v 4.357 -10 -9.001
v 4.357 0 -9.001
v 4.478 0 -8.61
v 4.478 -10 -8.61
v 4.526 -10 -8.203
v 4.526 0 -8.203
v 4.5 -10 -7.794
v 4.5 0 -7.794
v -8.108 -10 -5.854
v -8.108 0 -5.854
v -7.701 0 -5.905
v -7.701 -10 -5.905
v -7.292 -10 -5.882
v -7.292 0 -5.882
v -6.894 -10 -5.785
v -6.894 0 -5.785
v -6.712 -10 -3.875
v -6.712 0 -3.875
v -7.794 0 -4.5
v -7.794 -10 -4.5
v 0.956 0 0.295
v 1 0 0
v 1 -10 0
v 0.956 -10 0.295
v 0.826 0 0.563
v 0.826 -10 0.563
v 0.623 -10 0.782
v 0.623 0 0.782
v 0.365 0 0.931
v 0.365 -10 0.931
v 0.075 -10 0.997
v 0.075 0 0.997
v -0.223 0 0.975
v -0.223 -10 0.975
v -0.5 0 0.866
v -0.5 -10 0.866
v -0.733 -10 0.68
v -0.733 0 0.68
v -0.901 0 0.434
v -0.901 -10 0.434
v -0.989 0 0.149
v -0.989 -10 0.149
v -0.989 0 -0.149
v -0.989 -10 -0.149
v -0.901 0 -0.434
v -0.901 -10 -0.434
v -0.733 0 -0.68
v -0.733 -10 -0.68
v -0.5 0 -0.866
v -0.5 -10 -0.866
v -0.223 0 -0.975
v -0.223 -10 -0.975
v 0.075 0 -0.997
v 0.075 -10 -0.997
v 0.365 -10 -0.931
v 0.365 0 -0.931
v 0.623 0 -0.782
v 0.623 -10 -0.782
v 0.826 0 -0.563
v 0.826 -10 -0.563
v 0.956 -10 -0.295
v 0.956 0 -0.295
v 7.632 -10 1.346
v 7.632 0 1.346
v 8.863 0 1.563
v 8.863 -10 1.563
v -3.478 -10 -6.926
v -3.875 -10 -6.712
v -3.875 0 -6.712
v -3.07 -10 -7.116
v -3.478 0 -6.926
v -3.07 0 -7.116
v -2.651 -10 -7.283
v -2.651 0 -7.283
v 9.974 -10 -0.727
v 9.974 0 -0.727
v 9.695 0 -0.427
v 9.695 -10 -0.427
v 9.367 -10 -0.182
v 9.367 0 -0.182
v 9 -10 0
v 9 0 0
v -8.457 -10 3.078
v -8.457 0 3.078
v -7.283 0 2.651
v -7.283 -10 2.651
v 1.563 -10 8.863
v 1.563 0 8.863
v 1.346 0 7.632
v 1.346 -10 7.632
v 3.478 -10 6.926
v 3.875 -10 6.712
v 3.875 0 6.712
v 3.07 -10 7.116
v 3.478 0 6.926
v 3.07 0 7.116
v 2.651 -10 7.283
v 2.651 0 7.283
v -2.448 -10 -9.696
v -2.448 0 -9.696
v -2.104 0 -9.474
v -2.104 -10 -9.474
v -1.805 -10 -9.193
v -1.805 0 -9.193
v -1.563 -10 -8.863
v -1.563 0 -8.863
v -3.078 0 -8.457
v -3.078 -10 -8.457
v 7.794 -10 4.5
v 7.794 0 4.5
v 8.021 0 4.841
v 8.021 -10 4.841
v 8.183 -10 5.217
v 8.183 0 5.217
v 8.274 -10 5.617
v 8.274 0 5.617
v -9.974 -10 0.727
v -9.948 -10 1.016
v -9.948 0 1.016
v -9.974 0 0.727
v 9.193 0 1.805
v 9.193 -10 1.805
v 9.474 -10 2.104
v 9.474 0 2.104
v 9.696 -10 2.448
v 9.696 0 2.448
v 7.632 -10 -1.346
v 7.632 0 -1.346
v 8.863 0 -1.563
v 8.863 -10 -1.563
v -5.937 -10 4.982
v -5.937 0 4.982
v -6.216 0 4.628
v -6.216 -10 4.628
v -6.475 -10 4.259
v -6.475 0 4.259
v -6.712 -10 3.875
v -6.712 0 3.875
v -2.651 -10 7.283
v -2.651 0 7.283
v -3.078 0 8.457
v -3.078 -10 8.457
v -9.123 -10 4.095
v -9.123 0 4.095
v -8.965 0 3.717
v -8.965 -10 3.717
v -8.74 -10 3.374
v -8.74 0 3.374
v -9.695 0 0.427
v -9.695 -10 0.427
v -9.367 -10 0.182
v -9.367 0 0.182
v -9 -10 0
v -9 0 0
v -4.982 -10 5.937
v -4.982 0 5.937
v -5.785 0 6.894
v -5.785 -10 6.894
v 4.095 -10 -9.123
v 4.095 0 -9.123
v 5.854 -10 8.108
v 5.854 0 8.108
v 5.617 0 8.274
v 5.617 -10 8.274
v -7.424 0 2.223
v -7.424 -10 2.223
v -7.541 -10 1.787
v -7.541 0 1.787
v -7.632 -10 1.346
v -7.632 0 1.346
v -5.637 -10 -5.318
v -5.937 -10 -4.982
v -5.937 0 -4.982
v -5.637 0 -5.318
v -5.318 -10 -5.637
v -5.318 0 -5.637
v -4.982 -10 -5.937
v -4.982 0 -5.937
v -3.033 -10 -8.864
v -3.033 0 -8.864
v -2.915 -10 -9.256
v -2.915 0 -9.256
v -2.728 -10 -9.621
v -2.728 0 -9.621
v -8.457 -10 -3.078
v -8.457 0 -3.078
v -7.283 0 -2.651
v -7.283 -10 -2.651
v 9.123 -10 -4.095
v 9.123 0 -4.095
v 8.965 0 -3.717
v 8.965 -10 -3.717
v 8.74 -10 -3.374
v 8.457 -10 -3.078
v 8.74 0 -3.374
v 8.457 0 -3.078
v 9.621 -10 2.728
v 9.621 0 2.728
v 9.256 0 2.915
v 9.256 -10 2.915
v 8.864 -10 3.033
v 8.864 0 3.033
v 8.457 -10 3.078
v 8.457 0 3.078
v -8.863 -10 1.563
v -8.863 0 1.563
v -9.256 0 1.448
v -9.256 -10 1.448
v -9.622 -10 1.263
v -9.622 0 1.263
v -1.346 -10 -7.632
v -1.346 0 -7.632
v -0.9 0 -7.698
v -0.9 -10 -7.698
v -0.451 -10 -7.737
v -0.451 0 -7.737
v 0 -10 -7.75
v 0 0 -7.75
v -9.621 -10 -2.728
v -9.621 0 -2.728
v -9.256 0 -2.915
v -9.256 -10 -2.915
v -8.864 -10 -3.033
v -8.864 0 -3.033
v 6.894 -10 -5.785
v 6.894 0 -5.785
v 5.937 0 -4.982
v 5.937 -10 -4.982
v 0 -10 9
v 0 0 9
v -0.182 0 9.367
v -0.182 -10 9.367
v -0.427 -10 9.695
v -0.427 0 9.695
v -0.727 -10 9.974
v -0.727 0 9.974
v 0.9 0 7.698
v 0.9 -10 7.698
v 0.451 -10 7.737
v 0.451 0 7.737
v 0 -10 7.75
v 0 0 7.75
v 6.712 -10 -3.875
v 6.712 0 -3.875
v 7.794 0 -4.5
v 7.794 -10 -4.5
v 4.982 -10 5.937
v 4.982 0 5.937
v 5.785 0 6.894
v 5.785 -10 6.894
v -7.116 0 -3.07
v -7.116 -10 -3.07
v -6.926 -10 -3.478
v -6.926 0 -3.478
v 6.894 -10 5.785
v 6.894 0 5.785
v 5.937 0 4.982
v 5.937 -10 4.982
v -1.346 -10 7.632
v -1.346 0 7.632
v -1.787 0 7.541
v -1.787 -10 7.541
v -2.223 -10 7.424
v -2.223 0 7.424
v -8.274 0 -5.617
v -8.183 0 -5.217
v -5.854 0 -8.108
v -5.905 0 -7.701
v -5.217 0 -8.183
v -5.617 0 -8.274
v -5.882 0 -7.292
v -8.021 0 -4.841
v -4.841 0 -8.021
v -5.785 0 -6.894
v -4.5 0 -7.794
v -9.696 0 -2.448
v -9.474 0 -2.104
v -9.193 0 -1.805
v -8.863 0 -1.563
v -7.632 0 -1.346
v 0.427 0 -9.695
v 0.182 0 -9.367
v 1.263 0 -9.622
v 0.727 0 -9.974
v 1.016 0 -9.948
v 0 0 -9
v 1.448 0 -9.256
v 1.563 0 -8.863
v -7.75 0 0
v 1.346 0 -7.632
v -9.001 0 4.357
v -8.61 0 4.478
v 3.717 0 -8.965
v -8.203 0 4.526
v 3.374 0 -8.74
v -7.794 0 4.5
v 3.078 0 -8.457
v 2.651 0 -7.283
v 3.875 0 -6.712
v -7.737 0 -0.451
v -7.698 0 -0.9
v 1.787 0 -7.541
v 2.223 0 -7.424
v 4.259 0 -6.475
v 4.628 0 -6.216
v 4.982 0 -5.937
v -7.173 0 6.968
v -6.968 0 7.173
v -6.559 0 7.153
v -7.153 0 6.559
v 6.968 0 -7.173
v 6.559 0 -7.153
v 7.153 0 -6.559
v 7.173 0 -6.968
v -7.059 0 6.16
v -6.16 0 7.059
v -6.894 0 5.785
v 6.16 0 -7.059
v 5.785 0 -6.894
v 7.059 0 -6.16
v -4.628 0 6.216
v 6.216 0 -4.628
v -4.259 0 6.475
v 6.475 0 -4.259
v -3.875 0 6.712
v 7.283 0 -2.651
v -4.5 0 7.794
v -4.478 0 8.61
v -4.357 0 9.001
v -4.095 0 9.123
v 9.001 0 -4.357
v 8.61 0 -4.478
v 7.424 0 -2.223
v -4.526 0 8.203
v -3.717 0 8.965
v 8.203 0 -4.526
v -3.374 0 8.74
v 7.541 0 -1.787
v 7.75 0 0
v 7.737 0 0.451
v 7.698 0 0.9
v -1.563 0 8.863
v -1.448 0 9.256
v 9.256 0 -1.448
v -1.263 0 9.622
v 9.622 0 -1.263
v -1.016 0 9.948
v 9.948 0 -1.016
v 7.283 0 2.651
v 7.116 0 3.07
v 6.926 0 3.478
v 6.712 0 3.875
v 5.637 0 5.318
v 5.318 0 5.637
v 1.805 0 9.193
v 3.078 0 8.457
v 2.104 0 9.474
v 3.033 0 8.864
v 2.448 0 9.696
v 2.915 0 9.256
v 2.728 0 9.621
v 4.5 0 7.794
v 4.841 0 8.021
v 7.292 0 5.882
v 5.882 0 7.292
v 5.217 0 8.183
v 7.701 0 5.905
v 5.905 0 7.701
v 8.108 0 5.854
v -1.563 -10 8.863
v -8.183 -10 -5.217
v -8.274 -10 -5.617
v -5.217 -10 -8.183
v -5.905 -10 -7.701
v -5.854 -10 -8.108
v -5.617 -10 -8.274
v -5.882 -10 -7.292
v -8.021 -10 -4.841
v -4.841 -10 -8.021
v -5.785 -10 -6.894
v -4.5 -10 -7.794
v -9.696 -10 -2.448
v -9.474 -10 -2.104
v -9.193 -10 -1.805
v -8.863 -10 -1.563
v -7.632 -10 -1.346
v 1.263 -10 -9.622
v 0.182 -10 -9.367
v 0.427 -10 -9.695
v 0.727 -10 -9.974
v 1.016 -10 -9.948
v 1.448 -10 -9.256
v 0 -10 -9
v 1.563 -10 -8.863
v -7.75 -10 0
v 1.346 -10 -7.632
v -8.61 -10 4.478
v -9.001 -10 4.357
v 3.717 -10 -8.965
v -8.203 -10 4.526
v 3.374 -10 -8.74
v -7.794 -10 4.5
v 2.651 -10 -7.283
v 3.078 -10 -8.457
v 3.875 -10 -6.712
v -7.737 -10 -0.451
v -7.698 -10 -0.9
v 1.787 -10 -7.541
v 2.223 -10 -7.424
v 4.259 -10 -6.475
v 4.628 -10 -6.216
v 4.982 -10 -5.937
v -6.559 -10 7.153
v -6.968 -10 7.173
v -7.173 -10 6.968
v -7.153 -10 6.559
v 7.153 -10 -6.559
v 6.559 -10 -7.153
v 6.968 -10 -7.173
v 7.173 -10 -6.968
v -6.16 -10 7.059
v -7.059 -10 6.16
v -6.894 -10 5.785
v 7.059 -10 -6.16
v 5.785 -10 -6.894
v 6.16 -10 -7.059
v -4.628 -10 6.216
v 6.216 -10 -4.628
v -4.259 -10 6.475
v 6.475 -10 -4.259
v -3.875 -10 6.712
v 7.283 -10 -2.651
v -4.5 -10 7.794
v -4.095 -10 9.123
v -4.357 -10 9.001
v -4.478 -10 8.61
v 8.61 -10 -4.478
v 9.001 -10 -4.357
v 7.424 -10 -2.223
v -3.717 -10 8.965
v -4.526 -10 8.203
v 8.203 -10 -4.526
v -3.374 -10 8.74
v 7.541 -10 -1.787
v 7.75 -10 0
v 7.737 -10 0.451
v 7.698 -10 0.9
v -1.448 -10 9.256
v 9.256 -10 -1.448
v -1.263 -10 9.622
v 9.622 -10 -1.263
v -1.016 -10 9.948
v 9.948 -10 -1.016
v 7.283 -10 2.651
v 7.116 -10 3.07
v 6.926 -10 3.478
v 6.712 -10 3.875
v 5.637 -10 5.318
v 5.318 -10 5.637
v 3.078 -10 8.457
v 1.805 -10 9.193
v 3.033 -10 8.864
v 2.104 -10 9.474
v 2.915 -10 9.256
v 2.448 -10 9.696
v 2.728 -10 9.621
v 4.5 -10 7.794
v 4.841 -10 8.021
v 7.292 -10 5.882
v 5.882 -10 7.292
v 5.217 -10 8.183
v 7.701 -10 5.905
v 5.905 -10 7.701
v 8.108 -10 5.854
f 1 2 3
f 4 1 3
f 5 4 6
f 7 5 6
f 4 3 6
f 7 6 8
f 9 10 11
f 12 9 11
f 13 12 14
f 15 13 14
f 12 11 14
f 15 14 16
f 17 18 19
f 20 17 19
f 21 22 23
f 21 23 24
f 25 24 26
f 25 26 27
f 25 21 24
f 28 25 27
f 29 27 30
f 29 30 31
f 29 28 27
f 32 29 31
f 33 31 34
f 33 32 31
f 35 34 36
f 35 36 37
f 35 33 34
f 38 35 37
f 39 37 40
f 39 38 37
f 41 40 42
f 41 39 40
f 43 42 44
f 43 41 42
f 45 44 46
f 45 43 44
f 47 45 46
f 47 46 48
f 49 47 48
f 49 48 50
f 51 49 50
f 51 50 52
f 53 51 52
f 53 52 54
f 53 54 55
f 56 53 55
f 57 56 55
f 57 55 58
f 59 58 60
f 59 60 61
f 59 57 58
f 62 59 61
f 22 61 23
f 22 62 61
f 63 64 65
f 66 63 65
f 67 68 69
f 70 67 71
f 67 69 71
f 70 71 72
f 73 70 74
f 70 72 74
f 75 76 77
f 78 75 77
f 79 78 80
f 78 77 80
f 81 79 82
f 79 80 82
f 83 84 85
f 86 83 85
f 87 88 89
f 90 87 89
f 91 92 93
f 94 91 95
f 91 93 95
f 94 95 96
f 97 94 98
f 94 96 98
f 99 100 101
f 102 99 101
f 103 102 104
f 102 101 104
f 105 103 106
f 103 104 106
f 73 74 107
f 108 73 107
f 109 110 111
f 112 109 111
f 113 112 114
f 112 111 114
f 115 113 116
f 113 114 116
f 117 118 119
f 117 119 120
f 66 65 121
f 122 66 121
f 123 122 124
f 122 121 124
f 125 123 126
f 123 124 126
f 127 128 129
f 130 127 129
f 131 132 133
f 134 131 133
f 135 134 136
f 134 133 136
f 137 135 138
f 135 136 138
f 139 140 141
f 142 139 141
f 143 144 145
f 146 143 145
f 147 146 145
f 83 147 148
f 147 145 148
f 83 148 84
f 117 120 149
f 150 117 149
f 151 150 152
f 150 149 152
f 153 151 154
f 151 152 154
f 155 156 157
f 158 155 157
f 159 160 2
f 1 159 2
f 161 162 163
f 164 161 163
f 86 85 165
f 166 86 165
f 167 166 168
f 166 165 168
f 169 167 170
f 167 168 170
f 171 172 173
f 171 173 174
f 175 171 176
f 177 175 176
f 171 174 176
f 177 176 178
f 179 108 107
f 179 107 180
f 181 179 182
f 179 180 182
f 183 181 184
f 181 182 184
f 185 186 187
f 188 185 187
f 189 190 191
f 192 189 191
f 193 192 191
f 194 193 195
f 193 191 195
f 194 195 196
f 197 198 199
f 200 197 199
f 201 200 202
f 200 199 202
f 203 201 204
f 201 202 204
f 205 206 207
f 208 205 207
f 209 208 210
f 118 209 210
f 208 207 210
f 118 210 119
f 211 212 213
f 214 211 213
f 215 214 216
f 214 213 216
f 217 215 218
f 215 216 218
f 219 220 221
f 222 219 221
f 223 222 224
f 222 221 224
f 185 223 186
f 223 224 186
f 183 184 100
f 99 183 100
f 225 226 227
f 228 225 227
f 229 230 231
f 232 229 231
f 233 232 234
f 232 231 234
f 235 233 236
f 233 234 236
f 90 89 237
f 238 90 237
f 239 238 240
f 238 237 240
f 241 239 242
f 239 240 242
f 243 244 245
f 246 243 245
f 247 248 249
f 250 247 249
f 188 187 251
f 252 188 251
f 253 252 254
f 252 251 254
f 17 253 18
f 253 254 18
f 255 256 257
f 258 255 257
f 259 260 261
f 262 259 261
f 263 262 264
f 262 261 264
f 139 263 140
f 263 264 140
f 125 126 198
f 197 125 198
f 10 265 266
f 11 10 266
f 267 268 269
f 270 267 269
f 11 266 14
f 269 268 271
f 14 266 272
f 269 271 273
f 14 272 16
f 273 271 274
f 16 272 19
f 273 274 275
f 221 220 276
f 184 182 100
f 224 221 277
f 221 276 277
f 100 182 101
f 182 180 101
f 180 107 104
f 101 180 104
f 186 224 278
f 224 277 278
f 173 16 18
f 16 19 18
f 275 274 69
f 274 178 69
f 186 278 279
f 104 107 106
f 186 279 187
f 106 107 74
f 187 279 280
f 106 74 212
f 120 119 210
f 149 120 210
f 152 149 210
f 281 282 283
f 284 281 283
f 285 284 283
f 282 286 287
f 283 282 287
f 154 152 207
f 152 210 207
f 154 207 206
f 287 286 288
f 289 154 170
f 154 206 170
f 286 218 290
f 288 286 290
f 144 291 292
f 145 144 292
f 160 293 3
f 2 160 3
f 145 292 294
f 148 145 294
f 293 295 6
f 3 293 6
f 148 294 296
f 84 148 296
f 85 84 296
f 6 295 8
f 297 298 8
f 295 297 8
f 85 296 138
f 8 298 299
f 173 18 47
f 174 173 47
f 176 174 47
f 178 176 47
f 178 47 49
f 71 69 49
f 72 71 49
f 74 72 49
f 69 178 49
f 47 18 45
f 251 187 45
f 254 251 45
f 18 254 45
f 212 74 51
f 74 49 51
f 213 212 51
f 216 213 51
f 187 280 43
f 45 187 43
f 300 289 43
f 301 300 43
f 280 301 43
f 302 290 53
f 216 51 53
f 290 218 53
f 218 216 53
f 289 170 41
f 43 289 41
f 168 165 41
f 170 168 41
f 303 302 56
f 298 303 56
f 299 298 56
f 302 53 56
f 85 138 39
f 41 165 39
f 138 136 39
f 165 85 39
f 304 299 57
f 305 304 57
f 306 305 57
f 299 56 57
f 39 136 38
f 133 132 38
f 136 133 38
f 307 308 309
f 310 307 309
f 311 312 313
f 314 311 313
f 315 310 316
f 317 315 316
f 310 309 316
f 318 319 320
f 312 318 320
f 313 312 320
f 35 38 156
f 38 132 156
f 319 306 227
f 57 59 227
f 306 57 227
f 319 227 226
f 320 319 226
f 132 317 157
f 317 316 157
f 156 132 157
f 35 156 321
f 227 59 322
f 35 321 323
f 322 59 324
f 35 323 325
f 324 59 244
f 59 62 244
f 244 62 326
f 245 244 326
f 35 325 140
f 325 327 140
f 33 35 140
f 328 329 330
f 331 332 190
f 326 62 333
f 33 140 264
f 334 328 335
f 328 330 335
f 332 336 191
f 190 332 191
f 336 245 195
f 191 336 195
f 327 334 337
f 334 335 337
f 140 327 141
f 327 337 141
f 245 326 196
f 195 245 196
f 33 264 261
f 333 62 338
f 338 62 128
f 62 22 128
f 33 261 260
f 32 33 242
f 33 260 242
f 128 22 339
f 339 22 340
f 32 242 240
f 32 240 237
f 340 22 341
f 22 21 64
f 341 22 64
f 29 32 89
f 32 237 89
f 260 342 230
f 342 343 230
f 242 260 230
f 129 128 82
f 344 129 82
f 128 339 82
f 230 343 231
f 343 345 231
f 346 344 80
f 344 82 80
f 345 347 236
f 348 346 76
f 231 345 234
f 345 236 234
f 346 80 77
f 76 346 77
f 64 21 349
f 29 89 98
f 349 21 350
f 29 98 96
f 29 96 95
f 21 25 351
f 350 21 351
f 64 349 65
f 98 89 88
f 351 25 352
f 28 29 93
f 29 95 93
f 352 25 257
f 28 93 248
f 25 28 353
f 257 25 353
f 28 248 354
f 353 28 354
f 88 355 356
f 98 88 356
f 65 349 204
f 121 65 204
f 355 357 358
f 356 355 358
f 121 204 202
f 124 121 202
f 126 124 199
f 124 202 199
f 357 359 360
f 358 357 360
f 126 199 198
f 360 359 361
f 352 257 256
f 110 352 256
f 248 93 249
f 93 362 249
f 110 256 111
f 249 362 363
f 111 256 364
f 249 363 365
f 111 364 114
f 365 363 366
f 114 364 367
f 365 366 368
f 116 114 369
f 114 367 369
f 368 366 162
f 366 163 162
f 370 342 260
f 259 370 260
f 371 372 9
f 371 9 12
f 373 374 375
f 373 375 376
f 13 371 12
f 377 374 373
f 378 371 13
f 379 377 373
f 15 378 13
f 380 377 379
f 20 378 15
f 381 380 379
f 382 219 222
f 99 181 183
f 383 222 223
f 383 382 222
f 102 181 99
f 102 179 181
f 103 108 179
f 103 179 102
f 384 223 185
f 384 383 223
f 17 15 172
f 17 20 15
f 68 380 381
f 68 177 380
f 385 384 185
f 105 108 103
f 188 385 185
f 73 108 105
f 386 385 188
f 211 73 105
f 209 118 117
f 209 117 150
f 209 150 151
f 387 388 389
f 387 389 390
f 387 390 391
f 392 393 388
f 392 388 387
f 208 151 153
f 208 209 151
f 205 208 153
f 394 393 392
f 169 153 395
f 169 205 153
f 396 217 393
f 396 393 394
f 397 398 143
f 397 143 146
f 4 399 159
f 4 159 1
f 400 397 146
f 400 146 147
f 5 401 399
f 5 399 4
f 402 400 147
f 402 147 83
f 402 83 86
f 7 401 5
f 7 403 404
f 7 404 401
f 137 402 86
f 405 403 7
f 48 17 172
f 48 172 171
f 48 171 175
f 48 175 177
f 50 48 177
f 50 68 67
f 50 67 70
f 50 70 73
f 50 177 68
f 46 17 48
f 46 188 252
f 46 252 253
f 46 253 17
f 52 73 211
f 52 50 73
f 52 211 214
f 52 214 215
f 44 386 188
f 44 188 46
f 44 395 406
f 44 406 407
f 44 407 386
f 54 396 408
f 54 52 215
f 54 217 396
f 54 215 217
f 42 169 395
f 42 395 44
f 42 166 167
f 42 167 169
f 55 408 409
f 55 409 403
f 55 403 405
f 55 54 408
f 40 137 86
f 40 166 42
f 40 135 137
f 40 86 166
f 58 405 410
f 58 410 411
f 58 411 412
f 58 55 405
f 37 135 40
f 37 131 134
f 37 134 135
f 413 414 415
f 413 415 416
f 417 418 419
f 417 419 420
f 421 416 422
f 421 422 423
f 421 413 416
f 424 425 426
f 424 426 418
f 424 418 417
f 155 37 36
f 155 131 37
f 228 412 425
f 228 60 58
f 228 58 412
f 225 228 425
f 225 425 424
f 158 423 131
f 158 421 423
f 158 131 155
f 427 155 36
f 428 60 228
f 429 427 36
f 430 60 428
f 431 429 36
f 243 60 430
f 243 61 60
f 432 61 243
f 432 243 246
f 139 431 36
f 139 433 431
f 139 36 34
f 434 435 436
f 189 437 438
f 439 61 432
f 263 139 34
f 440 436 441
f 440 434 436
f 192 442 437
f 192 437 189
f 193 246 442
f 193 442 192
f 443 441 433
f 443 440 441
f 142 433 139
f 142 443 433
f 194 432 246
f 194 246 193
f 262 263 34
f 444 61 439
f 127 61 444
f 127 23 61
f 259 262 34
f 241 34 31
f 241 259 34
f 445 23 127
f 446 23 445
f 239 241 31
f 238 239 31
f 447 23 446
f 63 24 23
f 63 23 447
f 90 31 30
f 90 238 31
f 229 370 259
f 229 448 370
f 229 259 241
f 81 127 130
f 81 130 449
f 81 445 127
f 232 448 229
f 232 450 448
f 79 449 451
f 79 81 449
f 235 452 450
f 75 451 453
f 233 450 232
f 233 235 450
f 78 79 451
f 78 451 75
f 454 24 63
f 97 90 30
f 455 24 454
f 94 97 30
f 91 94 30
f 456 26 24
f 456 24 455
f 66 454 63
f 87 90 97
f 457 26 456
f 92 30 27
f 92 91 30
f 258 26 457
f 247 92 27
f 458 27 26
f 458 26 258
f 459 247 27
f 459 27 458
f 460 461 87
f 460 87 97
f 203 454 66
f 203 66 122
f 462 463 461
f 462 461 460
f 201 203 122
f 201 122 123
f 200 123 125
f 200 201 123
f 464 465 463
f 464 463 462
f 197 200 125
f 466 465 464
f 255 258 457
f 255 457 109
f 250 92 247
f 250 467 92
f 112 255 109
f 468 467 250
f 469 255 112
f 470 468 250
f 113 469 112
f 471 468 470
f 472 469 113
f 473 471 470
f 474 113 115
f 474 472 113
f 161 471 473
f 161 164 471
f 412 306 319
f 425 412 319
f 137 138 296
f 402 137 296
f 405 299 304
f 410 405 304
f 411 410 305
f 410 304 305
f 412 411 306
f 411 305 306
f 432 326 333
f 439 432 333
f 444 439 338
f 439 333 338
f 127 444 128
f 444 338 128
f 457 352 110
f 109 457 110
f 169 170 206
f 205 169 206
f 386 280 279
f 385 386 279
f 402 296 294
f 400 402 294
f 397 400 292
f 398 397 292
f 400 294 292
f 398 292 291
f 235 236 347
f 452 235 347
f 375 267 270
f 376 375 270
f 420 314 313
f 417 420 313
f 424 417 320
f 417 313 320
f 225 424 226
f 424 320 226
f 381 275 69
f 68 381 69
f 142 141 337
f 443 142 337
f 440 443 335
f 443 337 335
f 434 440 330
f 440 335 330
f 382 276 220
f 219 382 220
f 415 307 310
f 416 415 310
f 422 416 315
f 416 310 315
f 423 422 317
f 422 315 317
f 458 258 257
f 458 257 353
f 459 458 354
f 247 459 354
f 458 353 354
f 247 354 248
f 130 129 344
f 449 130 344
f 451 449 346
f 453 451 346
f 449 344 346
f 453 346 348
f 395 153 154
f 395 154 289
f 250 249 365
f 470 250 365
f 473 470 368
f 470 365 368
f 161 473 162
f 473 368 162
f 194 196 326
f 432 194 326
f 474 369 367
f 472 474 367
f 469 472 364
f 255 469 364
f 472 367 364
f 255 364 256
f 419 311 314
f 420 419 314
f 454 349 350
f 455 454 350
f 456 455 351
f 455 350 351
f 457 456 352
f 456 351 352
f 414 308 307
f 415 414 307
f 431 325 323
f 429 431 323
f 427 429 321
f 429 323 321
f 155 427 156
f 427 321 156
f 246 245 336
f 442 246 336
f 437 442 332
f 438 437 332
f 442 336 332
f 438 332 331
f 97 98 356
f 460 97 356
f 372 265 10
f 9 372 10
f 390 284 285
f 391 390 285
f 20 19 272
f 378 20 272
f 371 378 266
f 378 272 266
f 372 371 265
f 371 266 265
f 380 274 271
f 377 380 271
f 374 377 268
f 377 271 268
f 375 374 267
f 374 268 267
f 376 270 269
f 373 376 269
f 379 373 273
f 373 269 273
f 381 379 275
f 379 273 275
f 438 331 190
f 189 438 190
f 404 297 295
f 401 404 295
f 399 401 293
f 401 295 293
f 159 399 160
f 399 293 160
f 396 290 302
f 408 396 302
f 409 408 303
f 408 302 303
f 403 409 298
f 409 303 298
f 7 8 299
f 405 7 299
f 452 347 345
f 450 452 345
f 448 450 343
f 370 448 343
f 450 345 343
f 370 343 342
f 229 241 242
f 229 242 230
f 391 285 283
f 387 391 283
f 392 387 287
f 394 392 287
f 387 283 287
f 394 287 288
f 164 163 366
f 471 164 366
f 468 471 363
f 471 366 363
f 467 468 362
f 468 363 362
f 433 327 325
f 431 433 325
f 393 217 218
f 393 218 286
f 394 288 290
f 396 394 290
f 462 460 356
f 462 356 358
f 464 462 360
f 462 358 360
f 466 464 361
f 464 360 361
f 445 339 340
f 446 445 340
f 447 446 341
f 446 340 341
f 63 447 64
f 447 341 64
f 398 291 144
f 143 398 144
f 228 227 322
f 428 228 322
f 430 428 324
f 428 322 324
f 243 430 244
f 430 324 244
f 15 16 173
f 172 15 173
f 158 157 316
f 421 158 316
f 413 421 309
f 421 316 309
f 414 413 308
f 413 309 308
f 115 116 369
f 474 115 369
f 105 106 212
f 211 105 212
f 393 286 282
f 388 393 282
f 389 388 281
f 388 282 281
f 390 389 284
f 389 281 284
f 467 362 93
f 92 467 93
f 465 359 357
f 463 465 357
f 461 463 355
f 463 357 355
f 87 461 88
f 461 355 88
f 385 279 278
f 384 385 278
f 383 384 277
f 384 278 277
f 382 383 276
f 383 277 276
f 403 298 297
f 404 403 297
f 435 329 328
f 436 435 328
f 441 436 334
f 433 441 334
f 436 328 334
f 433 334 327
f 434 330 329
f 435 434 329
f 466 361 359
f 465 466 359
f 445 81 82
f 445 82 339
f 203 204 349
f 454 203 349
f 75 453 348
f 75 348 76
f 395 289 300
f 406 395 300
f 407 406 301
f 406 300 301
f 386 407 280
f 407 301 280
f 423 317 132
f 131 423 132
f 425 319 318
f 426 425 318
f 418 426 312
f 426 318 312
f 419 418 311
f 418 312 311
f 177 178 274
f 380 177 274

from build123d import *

# Parameters (mm, degrees)
F0_R     = 1
F1_DEPTH = 10


with BuildPart() as f1:
    # F0 (on Front) → F1 (new body)
    with BuildSketch(Plane.XZ):
        with BuildLine():
            Line((-1.562834, 8.86327), (-1.345773, 7.63226))
            ThreePointArc((-1.345773, 7.63226), (-2.005848, 7.485925), (-2.650656, 7.282618))
            Line((-2.650656, 7.282618), (-3.078181, 8.457234))
            ThreePointArc((-3.078181, 8.457234), (-3.540527, 8.860187), (-4.094507, 9.123322))
            Line((-4.094507, 9.123322), (-4.356972, 9.000933))
            ThreePointArc((-4.356972, 9.000933), (-4.51149, 8.407419), (-4.5, 7.794229))
            Line((-4.5, 7.794229), (-3.875, 6.711697))
            ThreePointArc((-3.875, 6.711697), (-4.445217, 6.348428), (-4.981604, 5.936844))
            Line((-4.981604, 5.936844), (-5.785088, 6.8944))
            ThreePointArc((-5.785088, 6.8944), (-6.357369, 7.114921), (-6.967938, 7.172715))
            Line((-6.967938, 7.172715), (-7.172715, 6.967938))
            ThreePointArc((-7.172715, 6.967938), (-7.114921, 6.357369), (-6.8944, 5.785088))
            Line((-6.8944, 5.785088), (-5.936844, 4.981604))
            ThreePointArc((-5.936844, 4.981604), (-6.348428, 4.445217), (-6.711697, 3.875))
            Line((-6.711697, 3.875), (-7.794229, 4.5))
            ThreePointArc((-7.794229, 4.5), (-8.407419, 4.51149), (-9.000933, 4.356972))
            Line((-9.000933, 4.356972), (-9.123322, 4.094507))
            ThreePointArc((-9.123322, 4.094507), (-8.860187, 3.540527), (-8.457234, 3.078181))
            Line((-8.457234, 3.078181), (-7.282618, 2.650656))
            ThreePointArc((-7.282618, 2.650656), (-7.485925, 2.005848), (-7.63226, 1.345773))
            Line((-7.63226, 1.345773), (-8.86327, 1.562834))
            ThreePointArc((-8.86327, 1.562834), (-9.44341, 1.363908), (-9.948283, 1.015714))
            Line((-9.948283, 1.015714), (-9.973523, 0.727218))
            ThreePointArc((-9.973523, 0.727218), (-9.536784, 0.296644), (-9, 0))
            Line((-9, 0), (-7.75, 0))
            ThreePointArc((-7.75, 0), (-7.720509, -0.675457), (-7.63226, -1.345773))
            Line((-7.63226, -1.345773), (-8.86327, -1.562834))
            ThreePointArc((-8.86327, -1.562834), (-9.340387, -1.948183), (-9.695722, -2.448054))
            Line((-9.695722, -2.448054), (-9.620769, -2.727784))
            ThreePointArc((-9.620769, -2.727784), (-9.063104, -2.983018), (-8.457234, -3.078181))
            Line((-8.457234, -3.078181), (-7.282618, -2.650656))
            ThreePointArc((-7.282618, -2.650656), (-7.023885, -3.275292), (-6.711697, -3.875))
            Line((-6.711697, -3.875), (-7.794229, -4.5))
            ThreePointArc((-7.794229, -4.5), (-8.110775, -5.025293), (-8.273715, -5.616551))
            Line((-8.273715, -5.616551), (-8.107608, -5.853776))
            ThreePointArc((-8.107608, -5.853776), (-7.496279, -5.902884), (-6.8944, -5.785088))
            Line((-6.8944, -5.785088), (-5.936844, -4.981604))
            ThreePointArc((-5.936844, -4.981604), (-5.480078, -5.480078), (-4.981604, -5.936844))
            Line((-4.981604, -5.936844), (-5.785088, -6.8944))
            ThreePointArc((-5.785088, -6.8944), (-5.902884, -7.496279), (-5.853776, -8.107608))
            Line((-5.853776, -8.107608), (-5.616551, -8.273715))
            ThreePointArc((-5.616551, -8.273715), (-5.025293, -8.110775), (-4.5, -7.794229))
            Line((-4.5, -7.794229), (-3.875, -6.711697))
            ThreePointArc((-3.875, -6.711697), (-3.275292, -7.023885), (-2.650656, -7.282618))
            Line((-2.650656, -7.282618), (-3.078181, -8.457234))
            ThreePointArc((-3.078181, -8.457234), (-2.983018, -9.063104), (-2.727784, -9.620769))
            Line((-2.727784, -9.620769), (-2.448054, -9.695722))
            ThreePointArc((-2.448054, -9.695722), (-1.948183, -9.340387), (-1.562834, -8.86327))
            Line((-1.562834, -8.86327), (-1.345773, -7.63226))
            ThreePointArc((-1.345773, -7.63226), (-0.675457, -7.720509), (0, -7.75))
            Line((0, -7.75), (0, -9))
            ThreePointArc((0, -9), (0.296644, -9.536784), (0.727218, -9.973523))
            Line((0.727218, -9.973523), (1.015714, -9.948283))
            ThreePointArc((1.015714, -9.948283), (1.363908, -9.44341), (1.562834, -8.86327))
            Line((1.562834, -8.86327), (1.345773, -7.63226))
            ThreePointArc((1.345773, -7.63226), (2.005848, -7.485925), (2.650656, -7.282618))
            Line((2.650656, -7.282618), (3.078181, -8.457234))
            ThreePointArc((3.078181, -8.457234), (3.540527, -8.860187), (4.094507, -9.123322))
            Line((4.094507, -9.123322), (4.356972, -9.000933))
            ThreePointArc((4.356972, -9.000933), (4.51149, -8.407419), (4.5, -7.794229))
            Line((4.5, -7.794229), (3.875, -6.711697))
            ThreePointArc((3.875, -6.711697), (4.445217, -6.348428), (4.981604, -5.936844))
            Line((4.981604, -5.936844), (5.785088, -6.8944))
            ThreePointArc((5.785088, -6.8944), (6.357369, -7.114921), (6.967938, -7.172715))
            Line((6.967938, -7.172715), (7.172715, -6.967938))
            ThreePointArc((7.172715, -6.967938), (7.114921, -6.357369), (6.8944, -5.785088))
            Line((6.8944, -5.785088), (5.936844, -4.981604))
            ThreePointArc((5.936844, -4.981604), (6.348428, -4.445217), (6.711697, -3.875))
            Line((6.711697, -3.875), (7.794229, -4.5))
            ThreePointArc((7.794229, -4.5), (8.407419, -4.51149), (9.000933, -4.356972))
            Line((9.000933, -4.356972), (9.123322, -4.094507))
            ThreePointArc((9.123322, -4.094507), (8.860187, -3.540527), (8.457234, -3.078181))
            Line((8.457234, -3.078181), (7.282618, -2.650656))
            ThreePointArc((7.282618, -2.650656), (7.485925, -2.005848), (7.63226, -1.345773))
            Line((7.63226, -1.345773), (8.86327, -1.562834))
            ThreePointArc((8.86327, -1.562834), (9.44341, -1.363908), (9.948283, -1.015714))
            Line((9.948283, -1.015714), (9.973523, -0.727218))
            ThreePointArc((9.973523, -0.727218), (9.536784, -0.296644), (9, 0))
            Line((9, 0), (7.75, 0))
            ThreePointArc((7.75, 0), (7.720509, 0.675457), (7.63226, 1.345773))
            Line((7.63226, 1.345773), (8.86327, 1.562834))
            ThreePointArc((8.86327, 1.562834), (9.340387, 1.948183), (9.695722, 2.448054))
            Line((9.695722, 2.448054), (9.620769, 2.727784))
            ThreePointArc((9.620769, 2.727784), (9.063104, 2.983018), (8.457234, 3.078181))
            Line((8.457234, 3.078181), (7.282618, 2.650656))
            ThreePointArc((7.282618, 2.650656), (7.023885, 3.275292), (6.711697, 3.875))
            Line((6.711697, 3.875), (7.794229, 4.5))
            ThreePointArc((7.794229, 4.5), (8.110775, 5.025293), (8.273715, 5.616551))
            Line((8.273715, 5.616551), (8.107608, 5.853776))
            ThreePointArc((8.107608, 5.853776), (7.496279, 5.902884), (6.8944, 5.785088))
            Line((6.8944, 5.785088), (5.936844, 4.981604))
            ThreePointArc((5.936844, 4.981604), (5.480078, 5.480078), (4.981604, 5.936844))
            Line((4.981604, 5.936844), (5.785088, 6.8944))
            ThreePointArc((5.785088, 6.8944), (5.902884, 7.496279), (5.853776, 8.107608))
            Line((5.853776, 8.107608), (5.616551, 8.273715))
            ThreePointArc((5.616551, 8.273715), (5.025293, 8.110775), (4.5, 7.794229))
            Line((4.5, 7.794229), (3.875, 6.711697))
            ThreePointArc((3.875, 6.711697), (3.275292, 7.023885), (2.650656, 7.282618))
            Line((2.650656, 7.282618), (3.078181, 8.457234))
            ThreePointArc((3.078181, 8.457234), (2.983018, 9.063104), (2.727784, 9.620769))
            Line((2.727784, 9.620769), (2.448054, 9.695722))
            ThreePointArc((2.448054, 9.695722), (1.948183, 9.340387), (1.562834, 8.86327))
            Line((1.562834, 8.86327), (1.345773, 7.63226))
            ThreePointArc((1.345773, 7.63226), (0.675457, 7.720509), (0, 7.75))
            Line((0, 7.75), (0, 9))
            ThreePointArc((0, 9), (-0.296644, 9.536784), (-0.727218, 9.973523))
            Line((-0.727218, 9.973523), (-1.015714, 9.948283))
            ThreePointArc((-1.015714, 9.948283), (-1.363908, 9.44341), (-1.562834, 8.86327))
        make_face()
        Circle(F0_R, mode=Mode.SUBTRACT)
    extrude(amount=F1_DEPTH)


solid = f1.part
